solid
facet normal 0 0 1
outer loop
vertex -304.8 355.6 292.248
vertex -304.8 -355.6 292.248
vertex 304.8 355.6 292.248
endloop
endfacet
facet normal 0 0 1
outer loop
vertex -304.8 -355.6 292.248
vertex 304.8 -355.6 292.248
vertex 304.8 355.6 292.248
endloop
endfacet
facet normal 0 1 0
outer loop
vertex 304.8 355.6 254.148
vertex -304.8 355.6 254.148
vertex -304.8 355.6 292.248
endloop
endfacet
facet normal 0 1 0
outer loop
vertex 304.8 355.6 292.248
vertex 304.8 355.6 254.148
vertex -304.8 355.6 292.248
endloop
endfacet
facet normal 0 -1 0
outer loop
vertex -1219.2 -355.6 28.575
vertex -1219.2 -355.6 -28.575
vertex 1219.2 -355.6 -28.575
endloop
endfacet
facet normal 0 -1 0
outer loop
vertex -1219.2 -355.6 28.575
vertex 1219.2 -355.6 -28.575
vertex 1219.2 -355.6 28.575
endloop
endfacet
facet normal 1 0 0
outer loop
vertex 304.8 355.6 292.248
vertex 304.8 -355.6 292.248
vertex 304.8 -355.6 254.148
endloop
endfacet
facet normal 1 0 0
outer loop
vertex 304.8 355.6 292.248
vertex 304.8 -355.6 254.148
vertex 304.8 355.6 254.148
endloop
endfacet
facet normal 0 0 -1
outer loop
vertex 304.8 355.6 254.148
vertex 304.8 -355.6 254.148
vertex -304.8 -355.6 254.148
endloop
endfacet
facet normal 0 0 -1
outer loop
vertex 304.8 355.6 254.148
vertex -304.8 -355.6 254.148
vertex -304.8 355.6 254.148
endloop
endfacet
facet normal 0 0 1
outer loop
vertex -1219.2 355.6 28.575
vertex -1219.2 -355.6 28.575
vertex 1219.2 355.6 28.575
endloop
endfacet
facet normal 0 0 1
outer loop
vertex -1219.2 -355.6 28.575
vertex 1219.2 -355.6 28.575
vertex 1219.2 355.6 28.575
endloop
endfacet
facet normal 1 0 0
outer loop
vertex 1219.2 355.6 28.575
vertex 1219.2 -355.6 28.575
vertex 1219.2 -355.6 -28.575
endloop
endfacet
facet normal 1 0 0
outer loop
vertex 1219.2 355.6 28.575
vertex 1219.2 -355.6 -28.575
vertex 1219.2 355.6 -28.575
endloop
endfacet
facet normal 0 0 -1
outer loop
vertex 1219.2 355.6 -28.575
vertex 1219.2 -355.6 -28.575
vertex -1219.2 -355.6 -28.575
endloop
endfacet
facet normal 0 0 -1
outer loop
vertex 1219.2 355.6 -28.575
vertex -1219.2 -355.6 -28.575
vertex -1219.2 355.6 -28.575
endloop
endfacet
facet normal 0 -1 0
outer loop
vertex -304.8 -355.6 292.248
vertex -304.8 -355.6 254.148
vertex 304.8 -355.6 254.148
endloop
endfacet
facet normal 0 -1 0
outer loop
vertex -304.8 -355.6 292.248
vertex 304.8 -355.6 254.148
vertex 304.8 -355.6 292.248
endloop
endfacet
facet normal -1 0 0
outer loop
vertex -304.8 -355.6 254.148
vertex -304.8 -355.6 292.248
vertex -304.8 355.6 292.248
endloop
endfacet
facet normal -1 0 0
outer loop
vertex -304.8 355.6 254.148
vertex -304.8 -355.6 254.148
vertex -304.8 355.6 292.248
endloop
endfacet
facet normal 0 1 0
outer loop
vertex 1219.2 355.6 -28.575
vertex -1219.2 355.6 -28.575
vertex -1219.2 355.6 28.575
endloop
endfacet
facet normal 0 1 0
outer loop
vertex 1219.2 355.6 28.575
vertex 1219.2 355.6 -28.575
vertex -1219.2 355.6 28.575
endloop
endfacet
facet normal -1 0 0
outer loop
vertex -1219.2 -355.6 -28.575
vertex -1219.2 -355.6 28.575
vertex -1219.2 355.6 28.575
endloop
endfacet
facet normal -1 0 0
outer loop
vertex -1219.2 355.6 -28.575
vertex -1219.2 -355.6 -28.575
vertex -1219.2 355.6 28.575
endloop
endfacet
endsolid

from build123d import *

# Parameters (mm, degrees)
F0_W     = 711.2
F0_H     = 57.15
F1_DEPTH = 1219.2
F2_W     = 711.2
F2_H     = 38.1
F3_DEPTH = 304.8


with BuildPart() as f1:
    # F0 (on Right) → F1 (new body, symmetric)
    with BuildSketch(Plane.YZ):
        Rectangle(F0_W, F0_H)
    extrude(amount=F1_DEPTH, both=True)


with BuildPart() as f3:
    # F2 (on Right) → F3 (new body, symmetric)
    with BuildSketch(Plane.YZ):
        with Locations((0, 273.197624)):
            Rectangle(F2_W, F2_H)
    extrude(amount=F3_DEPTH, both=True)


solid = Compound([f1.part, f3.part])
